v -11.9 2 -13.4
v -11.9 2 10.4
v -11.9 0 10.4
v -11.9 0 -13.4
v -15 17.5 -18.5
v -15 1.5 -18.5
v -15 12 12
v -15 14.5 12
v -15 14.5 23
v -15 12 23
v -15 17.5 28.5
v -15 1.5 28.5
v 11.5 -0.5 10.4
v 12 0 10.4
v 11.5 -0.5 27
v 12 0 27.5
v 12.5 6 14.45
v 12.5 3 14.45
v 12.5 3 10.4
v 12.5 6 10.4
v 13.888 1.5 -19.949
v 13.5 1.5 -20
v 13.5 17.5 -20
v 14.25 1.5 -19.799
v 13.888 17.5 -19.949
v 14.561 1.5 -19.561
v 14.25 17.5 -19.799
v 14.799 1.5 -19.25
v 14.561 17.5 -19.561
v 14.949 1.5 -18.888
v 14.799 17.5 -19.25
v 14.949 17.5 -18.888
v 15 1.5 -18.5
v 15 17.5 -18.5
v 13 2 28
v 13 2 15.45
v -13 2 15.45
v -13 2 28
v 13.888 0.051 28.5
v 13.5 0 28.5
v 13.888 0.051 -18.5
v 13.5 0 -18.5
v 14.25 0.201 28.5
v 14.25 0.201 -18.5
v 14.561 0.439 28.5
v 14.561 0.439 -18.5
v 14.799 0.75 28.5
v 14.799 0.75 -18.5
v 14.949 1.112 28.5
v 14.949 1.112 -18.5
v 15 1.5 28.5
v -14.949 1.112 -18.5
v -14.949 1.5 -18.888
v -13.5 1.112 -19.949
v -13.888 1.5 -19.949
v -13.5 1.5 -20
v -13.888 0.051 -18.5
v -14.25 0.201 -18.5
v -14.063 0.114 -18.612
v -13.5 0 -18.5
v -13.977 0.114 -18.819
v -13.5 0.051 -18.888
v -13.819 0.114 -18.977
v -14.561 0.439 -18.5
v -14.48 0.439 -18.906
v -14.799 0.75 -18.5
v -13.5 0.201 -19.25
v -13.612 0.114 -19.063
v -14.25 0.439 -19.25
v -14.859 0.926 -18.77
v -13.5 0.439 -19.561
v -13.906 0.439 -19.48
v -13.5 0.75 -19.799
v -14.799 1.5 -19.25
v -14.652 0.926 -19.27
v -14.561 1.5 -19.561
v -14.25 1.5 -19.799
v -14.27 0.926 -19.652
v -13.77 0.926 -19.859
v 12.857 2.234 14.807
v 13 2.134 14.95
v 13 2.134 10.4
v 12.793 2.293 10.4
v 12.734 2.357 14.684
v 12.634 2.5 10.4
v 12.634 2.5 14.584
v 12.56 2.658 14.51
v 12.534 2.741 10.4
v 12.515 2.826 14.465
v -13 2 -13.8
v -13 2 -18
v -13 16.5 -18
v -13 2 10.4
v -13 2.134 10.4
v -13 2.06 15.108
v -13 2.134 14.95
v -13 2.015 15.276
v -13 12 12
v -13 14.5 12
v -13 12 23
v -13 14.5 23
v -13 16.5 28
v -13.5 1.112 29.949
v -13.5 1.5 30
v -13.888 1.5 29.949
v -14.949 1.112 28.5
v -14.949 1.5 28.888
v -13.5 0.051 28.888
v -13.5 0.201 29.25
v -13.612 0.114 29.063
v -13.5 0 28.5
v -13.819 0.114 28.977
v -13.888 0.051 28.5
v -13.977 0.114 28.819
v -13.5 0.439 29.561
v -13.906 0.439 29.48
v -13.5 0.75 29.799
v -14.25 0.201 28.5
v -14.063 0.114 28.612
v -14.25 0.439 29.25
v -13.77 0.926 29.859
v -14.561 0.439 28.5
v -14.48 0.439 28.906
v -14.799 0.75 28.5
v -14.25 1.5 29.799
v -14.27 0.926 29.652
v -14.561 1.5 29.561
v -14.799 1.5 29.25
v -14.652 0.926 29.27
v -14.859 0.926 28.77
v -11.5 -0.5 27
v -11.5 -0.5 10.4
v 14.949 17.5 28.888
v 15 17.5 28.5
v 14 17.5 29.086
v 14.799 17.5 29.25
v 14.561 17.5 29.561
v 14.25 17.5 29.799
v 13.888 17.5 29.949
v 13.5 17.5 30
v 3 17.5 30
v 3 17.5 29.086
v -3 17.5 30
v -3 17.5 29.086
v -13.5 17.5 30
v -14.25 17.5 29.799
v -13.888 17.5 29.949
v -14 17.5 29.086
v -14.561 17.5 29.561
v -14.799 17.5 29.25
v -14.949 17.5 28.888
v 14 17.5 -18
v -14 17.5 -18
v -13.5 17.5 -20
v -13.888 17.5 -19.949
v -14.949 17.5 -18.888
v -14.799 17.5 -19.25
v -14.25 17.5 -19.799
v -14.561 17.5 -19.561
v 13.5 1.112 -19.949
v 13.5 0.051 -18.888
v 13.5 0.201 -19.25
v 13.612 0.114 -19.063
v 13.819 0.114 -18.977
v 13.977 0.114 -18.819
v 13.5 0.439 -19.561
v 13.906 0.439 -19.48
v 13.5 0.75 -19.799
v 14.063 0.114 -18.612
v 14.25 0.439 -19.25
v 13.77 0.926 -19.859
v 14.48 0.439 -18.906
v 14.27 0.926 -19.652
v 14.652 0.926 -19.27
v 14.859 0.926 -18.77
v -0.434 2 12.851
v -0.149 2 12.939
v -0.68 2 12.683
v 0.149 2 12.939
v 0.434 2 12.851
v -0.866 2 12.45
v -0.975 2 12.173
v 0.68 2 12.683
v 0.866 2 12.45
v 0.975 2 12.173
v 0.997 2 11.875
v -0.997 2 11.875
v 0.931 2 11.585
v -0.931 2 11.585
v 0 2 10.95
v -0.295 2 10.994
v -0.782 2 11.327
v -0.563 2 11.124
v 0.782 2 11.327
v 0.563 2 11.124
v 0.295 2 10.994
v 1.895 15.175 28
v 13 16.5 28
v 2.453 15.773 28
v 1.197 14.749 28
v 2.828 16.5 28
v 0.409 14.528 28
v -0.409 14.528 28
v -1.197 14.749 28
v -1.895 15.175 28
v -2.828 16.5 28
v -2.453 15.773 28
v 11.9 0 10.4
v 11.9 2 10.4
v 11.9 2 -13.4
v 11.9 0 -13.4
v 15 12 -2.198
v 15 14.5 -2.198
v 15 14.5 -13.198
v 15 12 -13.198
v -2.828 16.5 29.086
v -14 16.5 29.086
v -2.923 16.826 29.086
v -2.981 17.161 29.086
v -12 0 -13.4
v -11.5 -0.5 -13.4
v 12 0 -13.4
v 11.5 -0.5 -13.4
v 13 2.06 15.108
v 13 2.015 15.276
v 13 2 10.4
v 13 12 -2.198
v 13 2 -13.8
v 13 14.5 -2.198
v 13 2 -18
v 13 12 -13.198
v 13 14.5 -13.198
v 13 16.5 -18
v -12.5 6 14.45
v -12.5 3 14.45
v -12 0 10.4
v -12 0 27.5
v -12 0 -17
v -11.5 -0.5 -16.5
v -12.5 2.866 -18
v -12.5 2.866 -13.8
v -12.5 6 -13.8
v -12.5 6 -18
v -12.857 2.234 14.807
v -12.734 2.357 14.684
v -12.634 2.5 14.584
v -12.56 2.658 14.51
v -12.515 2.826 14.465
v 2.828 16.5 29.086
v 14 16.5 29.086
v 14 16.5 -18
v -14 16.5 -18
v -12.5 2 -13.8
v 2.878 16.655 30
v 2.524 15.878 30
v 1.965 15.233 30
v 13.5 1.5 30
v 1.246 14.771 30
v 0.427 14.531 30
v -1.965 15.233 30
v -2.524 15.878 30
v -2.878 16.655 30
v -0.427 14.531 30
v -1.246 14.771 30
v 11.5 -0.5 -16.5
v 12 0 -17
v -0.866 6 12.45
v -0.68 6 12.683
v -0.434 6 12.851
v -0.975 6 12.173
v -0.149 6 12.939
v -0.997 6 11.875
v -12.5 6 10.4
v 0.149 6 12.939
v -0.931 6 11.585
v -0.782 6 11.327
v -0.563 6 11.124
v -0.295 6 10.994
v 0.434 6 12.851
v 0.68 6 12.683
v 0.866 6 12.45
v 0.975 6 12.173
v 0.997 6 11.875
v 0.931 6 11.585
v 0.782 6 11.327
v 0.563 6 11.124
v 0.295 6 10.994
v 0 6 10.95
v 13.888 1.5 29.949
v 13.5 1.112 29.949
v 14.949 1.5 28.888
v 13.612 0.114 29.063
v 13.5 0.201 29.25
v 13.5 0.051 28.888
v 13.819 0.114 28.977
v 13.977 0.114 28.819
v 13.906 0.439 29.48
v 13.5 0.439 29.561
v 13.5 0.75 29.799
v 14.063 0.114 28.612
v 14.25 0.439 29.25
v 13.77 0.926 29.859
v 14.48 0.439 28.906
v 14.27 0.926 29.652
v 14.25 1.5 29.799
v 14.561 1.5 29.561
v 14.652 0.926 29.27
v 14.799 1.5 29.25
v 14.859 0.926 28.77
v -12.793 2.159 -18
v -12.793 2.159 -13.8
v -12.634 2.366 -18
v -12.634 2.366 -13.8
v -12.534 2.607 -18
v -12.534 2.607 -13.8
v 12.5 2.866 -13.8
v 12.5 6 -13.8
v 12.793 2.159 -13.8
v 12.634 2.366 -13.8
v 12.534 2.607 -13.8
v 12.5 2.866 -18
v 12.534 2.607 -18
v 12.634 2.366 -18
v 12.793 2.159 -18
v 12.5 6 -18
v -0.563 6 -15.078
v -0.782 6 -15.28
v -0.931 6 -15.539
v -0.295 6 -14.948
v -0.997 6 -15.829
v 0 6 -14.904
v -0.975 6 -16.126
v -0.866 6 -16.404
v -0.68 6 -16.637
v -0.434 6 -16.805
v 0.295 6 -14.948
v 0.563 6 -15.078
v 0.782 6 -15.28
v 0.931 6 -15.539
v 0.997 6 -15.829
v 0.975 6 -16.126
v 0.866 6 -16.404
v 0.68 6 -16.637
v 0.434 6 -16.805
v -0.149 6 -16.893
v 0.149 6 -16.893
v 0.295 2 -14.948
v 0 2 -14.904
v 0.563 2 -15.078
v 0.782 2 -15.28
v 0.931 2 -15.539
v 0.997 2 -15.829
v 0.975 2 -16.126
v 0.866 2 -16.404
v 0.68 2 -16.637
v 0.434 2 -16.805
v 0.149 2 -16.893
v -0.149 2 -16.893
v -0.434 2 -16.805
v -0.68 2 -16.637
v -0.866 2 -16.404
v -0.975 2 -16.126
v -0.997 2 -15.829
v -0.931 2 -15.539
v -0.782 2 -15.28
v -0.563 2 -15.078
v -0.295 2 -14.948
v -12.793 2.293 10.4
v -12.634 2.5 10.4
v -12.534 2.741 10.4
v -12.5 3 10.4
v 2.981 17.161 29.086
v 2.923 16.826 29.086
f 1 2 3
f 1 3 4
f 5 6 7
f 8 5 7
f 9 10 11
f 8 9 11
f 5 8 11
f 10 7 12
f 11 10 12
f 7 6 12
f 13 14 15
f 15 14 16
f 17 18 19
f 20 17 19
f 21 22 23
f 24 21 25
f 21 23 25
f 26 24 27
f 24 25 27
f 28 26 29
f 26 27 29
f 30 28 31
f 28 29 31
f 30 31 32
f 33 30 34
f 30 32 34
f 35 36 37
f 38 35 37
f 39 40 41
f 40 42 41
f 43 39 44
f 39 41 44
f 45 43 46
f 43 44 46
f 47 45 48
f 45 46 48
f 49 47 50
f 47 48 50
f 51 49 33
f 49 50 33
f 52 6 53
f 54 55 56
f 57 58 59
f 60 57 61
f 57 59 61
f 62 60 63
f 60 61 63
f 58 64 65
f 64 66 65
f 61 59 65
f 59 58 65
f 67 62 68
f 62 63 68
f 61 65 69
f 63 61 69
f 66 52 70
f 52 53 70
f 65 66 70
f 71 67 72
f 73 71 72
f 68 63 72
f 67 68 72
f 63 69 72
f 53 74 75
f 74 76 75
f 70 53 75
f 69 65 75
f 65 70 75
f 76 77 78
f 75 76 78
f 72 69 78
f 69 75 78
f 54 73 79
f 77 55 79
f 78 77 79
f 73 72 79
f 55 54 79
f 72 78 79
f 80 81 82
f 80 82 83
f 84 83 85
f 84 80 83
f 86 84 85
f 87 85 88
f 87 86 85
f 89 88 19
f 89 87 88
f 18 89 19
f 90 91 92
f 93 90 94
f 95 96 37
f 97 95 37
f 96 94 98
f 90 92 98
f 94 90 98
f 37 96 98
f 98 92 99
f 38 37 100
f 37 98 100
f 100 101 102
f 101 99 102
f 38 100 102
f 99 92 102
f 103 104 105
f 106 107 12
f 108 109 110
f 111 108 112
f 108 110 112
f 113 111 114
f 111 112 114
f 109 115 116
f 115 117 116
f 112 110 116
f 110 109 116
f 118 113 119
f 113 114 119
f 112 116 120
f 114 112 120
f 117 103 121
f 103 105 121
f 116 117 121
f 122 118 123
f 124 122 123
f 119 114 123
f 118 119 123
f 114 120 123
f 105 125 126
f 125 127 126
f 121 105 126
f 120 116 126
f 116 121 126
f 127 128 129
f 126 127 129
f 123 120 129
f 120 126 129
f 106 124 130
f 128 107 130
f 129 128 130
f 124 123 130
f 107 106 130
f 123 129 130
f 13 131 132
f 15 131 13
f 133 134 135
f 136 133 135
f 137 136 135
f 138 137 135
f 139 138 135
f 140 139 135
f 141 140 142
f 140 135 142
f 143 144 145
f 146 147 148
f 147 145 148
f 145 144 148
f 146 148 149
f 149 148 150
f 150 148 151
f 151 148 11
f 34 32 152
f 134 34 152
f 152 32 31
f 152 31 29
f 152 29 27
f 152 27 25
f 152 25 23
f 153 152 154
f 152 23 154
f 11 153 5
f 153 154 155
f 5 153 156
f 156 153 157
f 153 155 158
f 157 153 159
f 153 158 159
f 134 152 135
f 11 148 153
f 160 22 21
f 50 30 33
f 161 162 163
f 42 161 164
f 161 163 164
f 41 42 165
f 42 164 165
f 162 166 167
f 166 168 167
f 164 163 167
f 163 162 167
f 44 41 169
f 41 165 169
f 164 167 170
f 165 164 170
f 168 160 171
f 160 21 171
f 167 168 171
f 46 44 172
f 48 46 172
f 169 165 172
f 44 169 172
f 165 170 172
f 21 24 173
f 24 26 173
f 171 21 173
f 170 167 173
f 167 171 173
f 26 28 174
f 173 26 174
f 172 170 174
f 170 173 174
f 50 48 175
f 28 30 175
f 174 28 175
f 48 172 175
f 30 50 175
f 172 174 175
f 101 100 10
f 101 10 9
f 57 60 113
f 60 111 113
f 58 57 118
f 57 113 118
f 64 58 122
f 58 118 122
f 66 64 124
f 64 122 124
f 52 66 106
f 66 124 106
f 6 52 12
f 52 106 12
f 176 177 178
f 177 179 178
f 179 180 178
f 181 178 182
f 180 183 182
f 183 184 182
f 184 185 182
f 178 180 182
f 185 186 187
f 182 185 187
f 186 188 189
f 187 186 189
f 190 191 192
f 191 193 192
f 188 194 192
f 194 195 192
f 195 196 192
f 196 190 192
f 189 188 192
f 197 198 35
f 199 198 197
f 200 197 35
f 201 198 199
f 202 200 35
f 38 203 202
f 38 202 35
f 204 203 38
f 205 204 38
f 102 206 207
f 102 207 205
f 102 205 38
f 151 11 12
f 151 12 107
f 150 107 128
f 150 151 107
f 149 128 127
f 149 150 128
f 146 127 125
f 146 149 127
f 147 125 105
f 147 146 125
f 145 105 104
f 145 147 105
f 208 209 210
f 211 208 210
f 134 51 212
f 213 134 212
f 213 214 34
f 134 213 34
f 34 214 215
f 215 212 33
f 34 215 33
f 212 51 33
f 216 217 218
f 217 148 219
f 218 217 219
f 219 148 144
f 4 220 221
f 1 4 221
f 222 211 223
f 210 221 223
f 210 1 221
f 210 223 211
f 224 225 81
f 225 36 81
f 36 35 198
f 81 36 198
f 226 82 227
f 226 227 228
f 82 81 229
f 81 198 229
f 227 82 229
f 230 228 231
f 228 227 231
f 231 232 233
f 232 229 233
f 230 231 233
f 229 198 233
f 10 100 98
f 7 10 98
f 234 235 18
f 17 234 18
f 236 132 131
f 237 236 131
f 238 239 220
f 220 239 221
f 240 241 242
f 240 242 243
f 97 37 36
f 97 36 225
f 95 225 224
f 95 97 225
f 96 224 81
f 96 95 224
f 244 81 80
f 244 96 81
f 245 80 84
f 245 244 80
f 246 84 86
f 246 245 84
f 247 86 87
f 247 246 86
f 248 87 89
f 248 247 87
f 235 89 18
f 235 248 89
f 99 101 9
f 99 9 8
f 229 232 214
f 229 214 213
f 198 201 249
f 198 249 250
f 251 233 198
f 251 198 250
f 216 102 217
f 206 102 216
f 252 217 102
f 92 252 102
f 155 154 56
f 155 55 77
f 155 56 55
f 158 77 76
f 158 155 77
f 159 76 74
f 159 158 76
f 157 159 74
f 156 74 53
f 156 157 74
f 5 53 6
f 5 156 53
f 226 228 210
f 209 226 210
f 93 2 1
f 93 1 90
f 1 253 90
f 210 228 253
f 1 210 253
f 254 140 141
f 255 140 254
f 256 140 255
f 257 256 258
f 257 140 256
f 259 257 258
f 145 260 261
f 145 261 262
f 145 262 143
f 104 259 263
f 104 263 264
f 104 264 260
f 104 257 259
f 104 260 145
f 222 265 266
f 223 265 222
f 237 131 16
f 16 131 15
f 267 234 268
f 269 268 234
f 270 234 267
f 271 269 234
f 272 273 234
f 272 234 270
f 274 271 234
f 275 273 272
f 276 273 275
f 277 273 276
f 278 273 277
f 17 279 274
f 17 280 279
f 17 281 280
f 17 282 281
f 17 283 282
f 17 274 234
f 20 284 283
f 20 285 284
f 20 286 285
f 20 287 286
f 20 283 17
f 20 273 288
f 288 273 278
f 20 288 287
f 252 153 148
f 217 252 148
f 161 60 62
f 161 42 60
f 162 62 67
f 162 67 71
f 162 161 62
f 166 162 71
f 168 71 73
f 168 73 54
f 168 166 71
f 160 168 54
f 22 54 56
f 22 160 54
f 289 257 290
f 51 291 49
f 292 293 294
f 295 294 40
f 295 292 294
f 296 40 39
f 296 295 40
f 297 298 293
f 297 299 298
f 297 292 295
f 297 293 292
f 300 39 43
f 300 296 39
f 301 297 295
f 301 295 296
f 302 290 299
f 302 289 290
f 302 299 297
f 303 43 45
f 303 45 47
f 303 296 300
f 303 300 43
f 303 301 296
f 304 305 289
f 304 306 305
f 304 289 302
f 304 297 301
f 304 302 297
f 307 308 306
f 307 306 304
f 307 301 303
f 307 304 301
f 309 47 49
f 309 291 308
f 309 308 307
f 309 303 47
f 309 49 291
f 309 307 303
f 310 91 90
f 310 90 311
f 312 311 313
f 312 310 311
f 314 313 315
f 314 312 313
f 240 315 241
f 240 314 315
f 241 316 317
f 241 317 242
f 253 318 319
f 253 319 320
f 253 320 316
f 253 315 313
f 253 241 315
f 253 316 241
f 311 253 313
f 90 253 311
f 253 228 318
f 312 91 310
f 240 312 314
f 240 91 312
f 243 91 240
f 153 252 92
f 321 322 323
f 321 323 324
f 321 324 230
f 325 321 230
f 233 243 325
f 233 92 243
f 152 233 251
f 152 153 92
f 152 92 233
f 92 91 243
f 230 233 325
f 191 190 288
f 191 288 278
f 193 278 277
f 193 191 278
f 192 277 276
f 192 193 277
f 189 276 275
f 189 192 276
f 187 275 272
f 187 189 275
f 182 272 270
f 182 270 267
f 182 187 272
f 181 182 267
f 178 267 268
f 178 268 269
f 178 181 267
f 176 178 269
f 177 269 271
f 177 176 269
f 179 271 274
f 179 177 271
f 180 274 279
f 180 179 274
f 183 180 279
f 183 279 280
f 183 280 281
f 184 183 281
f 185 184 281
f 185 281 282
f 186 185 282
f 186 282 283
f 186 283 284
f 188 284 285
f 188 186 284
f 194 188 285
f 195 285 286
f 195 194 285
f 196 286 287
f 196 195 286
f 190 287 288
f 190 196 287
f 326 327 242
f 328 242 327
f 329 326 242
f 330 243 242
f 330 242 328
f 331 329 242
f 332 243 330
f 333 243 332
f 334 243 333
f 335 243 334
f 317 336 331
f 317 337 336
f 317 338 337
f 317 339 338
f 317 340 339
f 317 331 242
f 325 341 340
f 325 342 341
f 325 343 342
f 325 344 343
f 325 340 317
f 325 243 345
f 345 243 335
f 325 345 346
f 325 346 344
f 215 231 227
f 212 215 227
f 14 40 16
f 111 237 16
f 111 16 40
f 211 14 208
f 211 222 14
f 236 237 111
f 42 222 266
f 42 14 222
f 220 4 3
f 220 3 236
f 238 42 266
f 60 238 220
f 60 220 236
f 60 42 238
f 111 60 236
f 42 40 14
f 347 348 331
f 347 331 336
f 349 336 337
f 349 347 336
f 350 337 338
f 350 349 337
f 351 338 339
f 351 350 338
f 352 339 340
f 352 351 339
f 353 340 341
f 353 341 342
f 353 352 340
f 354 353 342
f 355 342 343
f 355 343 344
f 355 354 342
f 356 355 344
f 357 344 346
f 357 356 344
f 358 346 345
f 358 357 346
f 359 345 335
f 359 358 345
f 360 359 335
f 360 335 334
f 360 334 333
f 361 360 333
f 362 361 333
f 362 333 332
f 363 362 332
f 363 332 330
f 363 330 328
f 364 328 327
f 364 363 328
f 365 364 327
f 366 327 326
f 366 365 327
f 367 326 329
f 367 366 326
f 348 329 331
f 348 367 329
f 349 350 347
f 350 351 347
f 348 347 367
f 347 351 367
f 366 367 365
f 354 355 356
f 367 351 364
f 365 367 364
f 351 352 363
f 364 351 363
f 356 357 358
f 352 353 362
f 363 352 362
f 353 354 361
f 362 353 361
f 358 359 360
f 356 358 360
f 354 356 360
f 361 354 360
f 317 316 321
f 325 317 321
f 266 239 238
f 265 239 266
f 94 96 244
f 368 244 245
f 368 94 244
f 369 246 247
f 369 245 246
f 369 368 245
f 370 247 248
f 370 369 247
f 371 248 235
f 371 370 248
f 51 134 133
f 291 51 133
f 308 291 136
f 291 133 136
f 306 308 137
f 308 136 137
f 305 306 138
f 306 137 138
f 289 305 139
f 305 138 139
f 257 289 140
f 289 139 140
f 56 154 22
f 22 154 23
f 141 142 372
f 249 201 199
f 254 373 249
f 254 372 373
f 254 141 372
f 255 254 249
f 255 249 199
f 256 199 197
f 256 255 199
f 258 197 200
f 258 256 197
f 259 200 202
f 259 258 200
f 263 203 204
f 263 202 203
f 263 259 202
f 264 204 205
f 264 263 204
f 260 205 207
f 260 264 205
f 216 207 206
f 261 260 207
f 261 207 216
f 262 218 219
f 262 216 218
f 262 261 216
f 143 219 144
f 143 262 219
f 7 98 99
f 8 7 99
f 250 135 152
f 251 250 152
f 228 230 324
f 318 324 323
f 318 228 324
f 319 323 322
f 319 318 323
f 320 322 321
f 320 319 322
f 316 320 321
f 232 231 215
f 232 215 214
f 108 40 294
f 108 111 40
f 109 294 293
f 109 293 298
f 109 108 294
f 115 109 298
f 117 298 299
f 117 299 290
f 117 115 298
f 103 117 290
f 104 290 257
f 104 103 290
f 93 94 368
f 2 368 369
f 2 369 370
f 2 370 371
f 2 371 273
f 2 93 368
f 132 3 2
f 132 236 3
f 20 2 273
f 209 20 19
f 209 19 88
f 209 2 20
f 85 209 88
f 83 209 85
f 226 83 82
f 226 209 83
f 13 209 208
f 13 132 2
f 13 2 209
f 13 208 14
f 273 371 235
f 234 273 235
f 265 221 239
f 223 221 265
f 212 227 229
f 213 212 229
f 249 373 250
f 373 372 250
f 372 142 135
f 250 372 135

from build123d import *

# Parameters (mm, degrees)
BOSS_EXTRUDE1_DEPTH = 17.5
CUT_EXTRUDE1_DEPTH  = 15.5
SKETCH7_W           = 23.8
SKETCH7_H           = 23.8
CUT_EXTRUDE4_DEPTH  = 37.949289574
SKETCH7_5_W         = 25
SKETCH7_5_H         = 4.2
SKETCH7_5_R         = 1
BOSS_EXTRUDE3_DEPTH = 4
FILLET2_R           = 1.5
CUT_EXTRUDE6_REACH  = 46.612
SKETCH14_W          = 11
SKETCH14_H          = 2.5
SKETCH20_W          = 11
SKETCH20_H          = 2.5
CUT_EXTRUDE7_DEPTH  = 45.612218057
SKETCH21_W          = 24
SKETCH21_H          = 17.1
SKETCH21_H_2        = 3.6
BOSS_EXTRUDE4_DEPTH = 0.5
CHAMFER2_SIZE       = 0.5
CUT_EXTRUDE8_DEPTH  = 1
CUT_EXTRUDE9_REACH  = 57.057
FILLET3_R           = 1


# Some blends are built 0.0001 mm under size
with BuildPart() as part:
    # Sketch1 → Boss-Extrude1 (new body)
    with BuildSketch(Plane(origin=(0, 0, 0), x_dir=(1, 0, 0), z_dir=(0, 1, 0))):
        Polygon((-15, 20), (15, 20), (15, -20), (15, -30), (-15, -30), (-15, -20), align=None)
    extrude(amount=BOSS_EXTRUDE1_DEPTH)

    # Sketch2 → Cut-Extrude1 (cut)
    with BuildSketch(Plane(origin=(0, 17.5, 0), x_dir=(1, 0, 0), z_dir=(0, 1, 0))):
        Polygon((-13, 18), (13, 18), (13, -18), (13, -28), (-13, -28), (-13, -18), align=None)
    extrude(amount=-CUT_EXTRUDE1_DEPTH, mode=Mode.SUBTRACT)

    # Sketch7 → Cut-Extrude4 (cut, through all)
    with BuildSketch(Plane(origin=(0, 2, 0), x_dir=(1, 0, 0), z_dir=(0, 1, 0))):
        with Locations((0, 1.5)):
            Rectangle(SKETCH7_W, SKETCH7_H)
    extrude(amount=-CUT_EXTRUDE4_DEPTH, mode=Mode.SUBTRACT)

    # Sketch7<5> → Boss-Extrude3 (add)
    # profile 1 of 2: a face of its own
    with BuildSketch(Plane(origin=(0, 2, 0), x_dir=(1, 0, 0), z_dir=(0, 1, 0))):
        with Locations((0, 15.9)):
            Rectangle(SKETCH7_5_W, SKETCH7_5_H)
        with Locations(Location((0, 15.903889524, 0), (0, 0, 270))):
            Circle(SKETCH7_5_R, mode=Mode.SUBTRACT)
    # profile 2 of 2: a face of its own
    with BuildSketch(Plane(origin=(0, 2, 0), x_dir=(1, 0, 0), z_dir=(0, 1, 0))):
        Polygon((-11.9, -10.4), (-12.5, -10.4), (-12.5, -14.45), (0, -14.45), (12.5, -14.45), (12.5, -10.4), align=None)
        with Locations(Location((0, -11.95, 0), (0, 0, 90))):
            Circle(SKETCH7_5_R, mode=Mode.SUBTRACT)
    extrude(amount=BOSS_EXTRUDE3_DEPTH)

    # Fillet2
    fillet2_edges = [part.edges().sort_by_distance(p)[0] for p in [
        (15, 8.75, 30),
        (-15, 8.75, 30),
        (-15, 8.75, -20),
        (15, 8.75, -20),
        (0, 0, 30),
        (-15, 0, 5),
        (0, 0, -20),
        (15, 0, 5),
    ]]
    fillet(fillet2_edges, radius=FILLET2_R)

    # Sketch14 → Cut-Extrude6 (cut, up to next)
    with BuildSketch(Plane(origin=(-13, 0, 0), x_dir=(0, 0, -1), z_dir=(1, 0, 0)), mode=Mode.PRIVATE) as cut_extrude6_sk1:
        with Locations((-17.5, 13.25)):
            Rectangle(SKETCH14_W, SKETCH14_H)
    cut_extrude6_tool1 = extrude(cut_extrude6_sk1.sketch, amount=-CUT_EXTRUDE6_REACH, mode=Mode.PRIVATE) & part.part
    add(cut_extrude6_tool1.solids().sort_by_distance((-13, 13.25, 17.5))[0], mode=Mode.SUBTRACT)

    # Sketch20 → Cut-Extrude7 (cut, through all)
    with BuildSketch(Plane.ZY.offset(-13)):
        with Locations((-7.698338616, 13.25)):
            Rectangle(SKETCH20_W, SKETCH20_H)
    extrude(amount=-CUT_EXTRUDE7_DEPTH, mode=Mode.SUBTRACT)

    # Sketch21 → Boss-Extrude4 (add)
    with BuildSketch(Plane.XZ):
        with Locations((0, 18.95)):
            Rectangle(SKETCH21_W, SKETCH21_H)
        with Locations((0, -15.2)):
            Rectangle(SKETCH21_W, SKETCH21_H_2)
    extrude(amount=BOSS_EXTRUDE4_DEPTH)

    # Chamfer2
    chamfer2_edges = [part.edges().sort_by_distance(p)[0] for p in [
        (12, -0.5, 18.95),
        (-12, -0.5, 18.95),
        (-12, -0.5, -15.2),
        (0, -0.5, -17),
        (12, -0.5, -15.2),
        (0, -0.5, 27.5),
    ]]
    chamfer(chamfer2_edges, length=CHAMFER2_SIZE - 0.0001)  # a hair under: the kernel refuses the full size

    # Sketch22 → Cut-Extrude8 (cut)
    with BuildSketch(Plane(origin=(0, 17.5, 0), x_dir=(1, 0, 0), z_dir=(0, 1, 0))):
        Polygon((-13, 18), (-14, 18), (-14, -19.085850071), (-14, -29.085850071), (14, -29.085850071), (14, -19.085850071), (14, 18), (13, 18), (13, -28), (-13, -28), align=None)
    extrude(amount=-CUT_EXTRUDE8_DEPTH, mode=Mode.SUBTRACT)

    # Sketch23 → Cut-Extrude9 (cut, up to next)
    with BuildSketch(Plane.XY.offset(30), mode=Mode.PRIVATE) as cut_extrude9_sk1:
        with BuildLine():
            Line((-3, 17.5), (3, 17.5))
            ThreePointArc((3, 17.5), (0, 14.5), (-3, 17.5))
        make_face()
    cut_extrude9_tool1 = extrude(cut_extrude9_sk1.sketch, amount=-CUT_EXTRUDE9_REACH, mode=Mode.PRIVATE) & part.part
    add(cut_extrude9_tool1.solids().sort_by_distance((0, 16.22676, 30))[0], mode=Mode.SUBTRACT)

    # Fillet3
    # the kernel refuses this fillet: 1 mm, written as the material it adds along each edge
    with BuildSketch(Plane(origin=(12.5, 2, -13.8), x_dir=(1, 0, 0), z_dir=(0, 0, -1))) as fillet3_piece_1_section:
        with BuildLine():
            CenterArc((1, -0.866025404), FILLET3_R, 120, 60)
            Line((0, -0.866025404), (0, 0))
            Line((0, 0), (0.5, 0))
        make_face()
    fillet3_piece_1 = extrude(amount=6.365063509, mode=Mode.PRIVATE)
    fillet3_piece_1 = split(fillet3_piece_1, bisect_by=Plane(origin=(12.5, 2, -20), z_dir=(0, 0, 1)), keep=Keep.TOP, mode=Mode.PRIVATE)
    add(fillet3_piece_1)
    with BuildSketch(Plane(origin=(-12.5, 2, -20.165063509), x_dir=(-1, 0, 0), z_dir=(0, 0, 1))) as fillet3_piece_2_section:
        with BuildLine():
            CenterArc((1, -0.866025404), FILLET3_R, 120, 60)
            Line((0, -0.866025404), (0, 0))
            Line((0, 0), (0.5, 0))
        make_face()
    fillet3_piece_2 = extrude(amount=6.365063509, mode=Mode.PRIVATE)
    fillet3_piece_2 = split(fillet3_piece_2, bisect_by=Plane(origin=(-12.5, 2, -20), z_dir=(0, 0, 1)), keep=Keep.TOP, mode=Mode.PRIVATE)
    add(fillet3_piece_2)
    with BuildSketch(Plane(origin=(-12.5, 2, 10.4), x_dir=(-1, 0, 0), z_dir=(0, 0, 1)), Plane(origin=(12.5, 2, 14.45), x_dir=(1, 0, 0), z_dir=(0, 0, -1))) as fillet3_piece_3:
        with BuildLine():
            CenterArc((FILLET3_R, -FILLET3_R), FILLET3_R, 90, 90)
            Line((0, -FILLET3_R), (0, 0))
            Line((0, 0), (FILLET3_R, 0))
        make_face()
    extrude(amount=4.05)
    with BuildSketch(Plane(origin=(-12.5, 2, 14.45), x_dir=(0, 0, 1), z_dir=(1, 0, 0))) as fillet3_piece_4:
        with BuildLine():
            CenterArc((FILLET3_R, -FILLET3_R), FILLET3_R, 90, 90)
            Line((0, -FILLET3_R), (0, 0))
            Line((0, 0), (FILLET3_R, 0))
        make_face()
    extrude(amount=25)
    with BuildSketch(Plane(origin=(-15, 2, 14.45), x_dir=(0, 0, 1), z_dir=(1, 0, 0))) as fillet3_piece_5a_section:
        with BuildLine():
            CenterArc((FILLET3_R, -FILLET3_R), FILLET3_R, 90, 90)
            Line((0, -FILLET3_R), (0, 0))
            Line((0, 0), (FILLET3_R, 0))
        make_face()
    fillet3_piece_5a = extrude(amount=27.5, mode=Mode.PRIVATE)
    fillet3_piece_5a = split(fillet3_piece_5a, bisect_by=Plane(origin=(-13, 2, 14.45), z_dir=(1, 0, 0)), keep=Keep.TOP, mode=Mode.PRIVATE)
    fillet3_piece_5a = split(fillet3_piece_5a, bisect_by=Plane(origin=(-12.5, 2, 14.45), z_dir=(-1, 0, 0)), keep=Keep.TOP, mode=Mode.PRIVATE)
    with BuildSketch(Plane(origin=(-12.5, 2, 10.4), x_dir=(-1, 0, 0), z_dir=(0, 0, 1))) as fillet3_piece_5b_section:
        with BuildLine():
            CenterArc((FILLET3_R, -FILLET3_R), FILLET3_R, 90, 90)
            Line((0, -FILLET3_R), (0, 0))
            Line((0, 0), (FILLET3_R, 0))
        make_face()
    fillet3_piece_5b = extrude(amount=6.55, mode=Mode.PRIVATE)
    fillet3_piece_5b = split(fillet3_piece_5b, bisect_by=Plane(origin=(-13, 2, 10.4), z_dir=(1, 0, 0)), keep=Keep.TOP, mode=Mode.PRIVATE)
    fillet3_piece_5b = split(fillet3_piece_5b, bisect_by=Plane(origin=(-12.5, 2, 14.45), z_dir=(0, 0, 1)), keep=Keep.TOP, mode=Mode.PRIVATE)
    fillet3_piece_5 = fillet3_piece_5a & fillet3_piece_5b
    add(fillet3_piece_5)
    with BuildSketch(Plane(origin=(12.5, 2, 16.95), x_dir=(1, 0, 0), z_dir=(0, 0, -1))) as fillet3_piece_6a_section:
        with BuildLine():
            CenterArc((FILLET3_R, -FILLET3_R), FILLET3_R, 90, 90)
            Line((0, -FILLET3_R), (0, 0))
            Line((0, 0), (FILLET3_R, 0))
        make_face()
    fillet3_piece_6a = extrude(amount=6.55, mode=Mode.PRIVATE)
    fillet3_piece_6a = split(fillet3_piece_6a, bisect_by=Plane(origin=(13, 2, 16.95), z_dir=(-1, 0, 0)), keep=Keep.TOP, mode=Mode.PRIVATE)
    fillet3_piece_6a = split(fillet3_piece_6a, bisect_by=Plane(origin=(12.5, 2, 14.45), z_dir=(0, 0, 1)), keep=Keep.TOP, mode=Mode.PRIVATE)
    with BuildSketch(Plane(origin=(-12.5, 2, 14.45), x_dir=(0, 0, 1), z_dir=(1, 0, 0))) as fillet3_piece_6b_section:
        with BuildLine():
            CenterArc((FILLET3_R, -FILLET3_R), FILLET3_R, 90, 90)
            Line((0, -FILLET3_R), (0, 0))
            Line((0, 0), (FILLET3_R, 0))
        make_face()
    fillet3_piece_6b = extrude(amount=27.5, mode=Mode.PRIVATE)
    fillet3_piece_6b = split(fillet3_piece_6b, bisect_by=Plane(origin=(13, 2, 14.45), z_dir=(-1, 0, 0)), keep=Keep.TOP, mode=Mode.PRIVATE)
    fillet3_piece_6b = split(fillet3_piece_6b, bisect_by=Plane(origin=(12.5, 2, 14.45), z_dir=(1, 0, 0)), keep=Keep.TOP, mode=Mode.PRIVATE)
    fillet3_piece_6 = fillet3_piece_6a & fillet3_piece_6b
    add(fillet3_piece_6)


solid = part.part
